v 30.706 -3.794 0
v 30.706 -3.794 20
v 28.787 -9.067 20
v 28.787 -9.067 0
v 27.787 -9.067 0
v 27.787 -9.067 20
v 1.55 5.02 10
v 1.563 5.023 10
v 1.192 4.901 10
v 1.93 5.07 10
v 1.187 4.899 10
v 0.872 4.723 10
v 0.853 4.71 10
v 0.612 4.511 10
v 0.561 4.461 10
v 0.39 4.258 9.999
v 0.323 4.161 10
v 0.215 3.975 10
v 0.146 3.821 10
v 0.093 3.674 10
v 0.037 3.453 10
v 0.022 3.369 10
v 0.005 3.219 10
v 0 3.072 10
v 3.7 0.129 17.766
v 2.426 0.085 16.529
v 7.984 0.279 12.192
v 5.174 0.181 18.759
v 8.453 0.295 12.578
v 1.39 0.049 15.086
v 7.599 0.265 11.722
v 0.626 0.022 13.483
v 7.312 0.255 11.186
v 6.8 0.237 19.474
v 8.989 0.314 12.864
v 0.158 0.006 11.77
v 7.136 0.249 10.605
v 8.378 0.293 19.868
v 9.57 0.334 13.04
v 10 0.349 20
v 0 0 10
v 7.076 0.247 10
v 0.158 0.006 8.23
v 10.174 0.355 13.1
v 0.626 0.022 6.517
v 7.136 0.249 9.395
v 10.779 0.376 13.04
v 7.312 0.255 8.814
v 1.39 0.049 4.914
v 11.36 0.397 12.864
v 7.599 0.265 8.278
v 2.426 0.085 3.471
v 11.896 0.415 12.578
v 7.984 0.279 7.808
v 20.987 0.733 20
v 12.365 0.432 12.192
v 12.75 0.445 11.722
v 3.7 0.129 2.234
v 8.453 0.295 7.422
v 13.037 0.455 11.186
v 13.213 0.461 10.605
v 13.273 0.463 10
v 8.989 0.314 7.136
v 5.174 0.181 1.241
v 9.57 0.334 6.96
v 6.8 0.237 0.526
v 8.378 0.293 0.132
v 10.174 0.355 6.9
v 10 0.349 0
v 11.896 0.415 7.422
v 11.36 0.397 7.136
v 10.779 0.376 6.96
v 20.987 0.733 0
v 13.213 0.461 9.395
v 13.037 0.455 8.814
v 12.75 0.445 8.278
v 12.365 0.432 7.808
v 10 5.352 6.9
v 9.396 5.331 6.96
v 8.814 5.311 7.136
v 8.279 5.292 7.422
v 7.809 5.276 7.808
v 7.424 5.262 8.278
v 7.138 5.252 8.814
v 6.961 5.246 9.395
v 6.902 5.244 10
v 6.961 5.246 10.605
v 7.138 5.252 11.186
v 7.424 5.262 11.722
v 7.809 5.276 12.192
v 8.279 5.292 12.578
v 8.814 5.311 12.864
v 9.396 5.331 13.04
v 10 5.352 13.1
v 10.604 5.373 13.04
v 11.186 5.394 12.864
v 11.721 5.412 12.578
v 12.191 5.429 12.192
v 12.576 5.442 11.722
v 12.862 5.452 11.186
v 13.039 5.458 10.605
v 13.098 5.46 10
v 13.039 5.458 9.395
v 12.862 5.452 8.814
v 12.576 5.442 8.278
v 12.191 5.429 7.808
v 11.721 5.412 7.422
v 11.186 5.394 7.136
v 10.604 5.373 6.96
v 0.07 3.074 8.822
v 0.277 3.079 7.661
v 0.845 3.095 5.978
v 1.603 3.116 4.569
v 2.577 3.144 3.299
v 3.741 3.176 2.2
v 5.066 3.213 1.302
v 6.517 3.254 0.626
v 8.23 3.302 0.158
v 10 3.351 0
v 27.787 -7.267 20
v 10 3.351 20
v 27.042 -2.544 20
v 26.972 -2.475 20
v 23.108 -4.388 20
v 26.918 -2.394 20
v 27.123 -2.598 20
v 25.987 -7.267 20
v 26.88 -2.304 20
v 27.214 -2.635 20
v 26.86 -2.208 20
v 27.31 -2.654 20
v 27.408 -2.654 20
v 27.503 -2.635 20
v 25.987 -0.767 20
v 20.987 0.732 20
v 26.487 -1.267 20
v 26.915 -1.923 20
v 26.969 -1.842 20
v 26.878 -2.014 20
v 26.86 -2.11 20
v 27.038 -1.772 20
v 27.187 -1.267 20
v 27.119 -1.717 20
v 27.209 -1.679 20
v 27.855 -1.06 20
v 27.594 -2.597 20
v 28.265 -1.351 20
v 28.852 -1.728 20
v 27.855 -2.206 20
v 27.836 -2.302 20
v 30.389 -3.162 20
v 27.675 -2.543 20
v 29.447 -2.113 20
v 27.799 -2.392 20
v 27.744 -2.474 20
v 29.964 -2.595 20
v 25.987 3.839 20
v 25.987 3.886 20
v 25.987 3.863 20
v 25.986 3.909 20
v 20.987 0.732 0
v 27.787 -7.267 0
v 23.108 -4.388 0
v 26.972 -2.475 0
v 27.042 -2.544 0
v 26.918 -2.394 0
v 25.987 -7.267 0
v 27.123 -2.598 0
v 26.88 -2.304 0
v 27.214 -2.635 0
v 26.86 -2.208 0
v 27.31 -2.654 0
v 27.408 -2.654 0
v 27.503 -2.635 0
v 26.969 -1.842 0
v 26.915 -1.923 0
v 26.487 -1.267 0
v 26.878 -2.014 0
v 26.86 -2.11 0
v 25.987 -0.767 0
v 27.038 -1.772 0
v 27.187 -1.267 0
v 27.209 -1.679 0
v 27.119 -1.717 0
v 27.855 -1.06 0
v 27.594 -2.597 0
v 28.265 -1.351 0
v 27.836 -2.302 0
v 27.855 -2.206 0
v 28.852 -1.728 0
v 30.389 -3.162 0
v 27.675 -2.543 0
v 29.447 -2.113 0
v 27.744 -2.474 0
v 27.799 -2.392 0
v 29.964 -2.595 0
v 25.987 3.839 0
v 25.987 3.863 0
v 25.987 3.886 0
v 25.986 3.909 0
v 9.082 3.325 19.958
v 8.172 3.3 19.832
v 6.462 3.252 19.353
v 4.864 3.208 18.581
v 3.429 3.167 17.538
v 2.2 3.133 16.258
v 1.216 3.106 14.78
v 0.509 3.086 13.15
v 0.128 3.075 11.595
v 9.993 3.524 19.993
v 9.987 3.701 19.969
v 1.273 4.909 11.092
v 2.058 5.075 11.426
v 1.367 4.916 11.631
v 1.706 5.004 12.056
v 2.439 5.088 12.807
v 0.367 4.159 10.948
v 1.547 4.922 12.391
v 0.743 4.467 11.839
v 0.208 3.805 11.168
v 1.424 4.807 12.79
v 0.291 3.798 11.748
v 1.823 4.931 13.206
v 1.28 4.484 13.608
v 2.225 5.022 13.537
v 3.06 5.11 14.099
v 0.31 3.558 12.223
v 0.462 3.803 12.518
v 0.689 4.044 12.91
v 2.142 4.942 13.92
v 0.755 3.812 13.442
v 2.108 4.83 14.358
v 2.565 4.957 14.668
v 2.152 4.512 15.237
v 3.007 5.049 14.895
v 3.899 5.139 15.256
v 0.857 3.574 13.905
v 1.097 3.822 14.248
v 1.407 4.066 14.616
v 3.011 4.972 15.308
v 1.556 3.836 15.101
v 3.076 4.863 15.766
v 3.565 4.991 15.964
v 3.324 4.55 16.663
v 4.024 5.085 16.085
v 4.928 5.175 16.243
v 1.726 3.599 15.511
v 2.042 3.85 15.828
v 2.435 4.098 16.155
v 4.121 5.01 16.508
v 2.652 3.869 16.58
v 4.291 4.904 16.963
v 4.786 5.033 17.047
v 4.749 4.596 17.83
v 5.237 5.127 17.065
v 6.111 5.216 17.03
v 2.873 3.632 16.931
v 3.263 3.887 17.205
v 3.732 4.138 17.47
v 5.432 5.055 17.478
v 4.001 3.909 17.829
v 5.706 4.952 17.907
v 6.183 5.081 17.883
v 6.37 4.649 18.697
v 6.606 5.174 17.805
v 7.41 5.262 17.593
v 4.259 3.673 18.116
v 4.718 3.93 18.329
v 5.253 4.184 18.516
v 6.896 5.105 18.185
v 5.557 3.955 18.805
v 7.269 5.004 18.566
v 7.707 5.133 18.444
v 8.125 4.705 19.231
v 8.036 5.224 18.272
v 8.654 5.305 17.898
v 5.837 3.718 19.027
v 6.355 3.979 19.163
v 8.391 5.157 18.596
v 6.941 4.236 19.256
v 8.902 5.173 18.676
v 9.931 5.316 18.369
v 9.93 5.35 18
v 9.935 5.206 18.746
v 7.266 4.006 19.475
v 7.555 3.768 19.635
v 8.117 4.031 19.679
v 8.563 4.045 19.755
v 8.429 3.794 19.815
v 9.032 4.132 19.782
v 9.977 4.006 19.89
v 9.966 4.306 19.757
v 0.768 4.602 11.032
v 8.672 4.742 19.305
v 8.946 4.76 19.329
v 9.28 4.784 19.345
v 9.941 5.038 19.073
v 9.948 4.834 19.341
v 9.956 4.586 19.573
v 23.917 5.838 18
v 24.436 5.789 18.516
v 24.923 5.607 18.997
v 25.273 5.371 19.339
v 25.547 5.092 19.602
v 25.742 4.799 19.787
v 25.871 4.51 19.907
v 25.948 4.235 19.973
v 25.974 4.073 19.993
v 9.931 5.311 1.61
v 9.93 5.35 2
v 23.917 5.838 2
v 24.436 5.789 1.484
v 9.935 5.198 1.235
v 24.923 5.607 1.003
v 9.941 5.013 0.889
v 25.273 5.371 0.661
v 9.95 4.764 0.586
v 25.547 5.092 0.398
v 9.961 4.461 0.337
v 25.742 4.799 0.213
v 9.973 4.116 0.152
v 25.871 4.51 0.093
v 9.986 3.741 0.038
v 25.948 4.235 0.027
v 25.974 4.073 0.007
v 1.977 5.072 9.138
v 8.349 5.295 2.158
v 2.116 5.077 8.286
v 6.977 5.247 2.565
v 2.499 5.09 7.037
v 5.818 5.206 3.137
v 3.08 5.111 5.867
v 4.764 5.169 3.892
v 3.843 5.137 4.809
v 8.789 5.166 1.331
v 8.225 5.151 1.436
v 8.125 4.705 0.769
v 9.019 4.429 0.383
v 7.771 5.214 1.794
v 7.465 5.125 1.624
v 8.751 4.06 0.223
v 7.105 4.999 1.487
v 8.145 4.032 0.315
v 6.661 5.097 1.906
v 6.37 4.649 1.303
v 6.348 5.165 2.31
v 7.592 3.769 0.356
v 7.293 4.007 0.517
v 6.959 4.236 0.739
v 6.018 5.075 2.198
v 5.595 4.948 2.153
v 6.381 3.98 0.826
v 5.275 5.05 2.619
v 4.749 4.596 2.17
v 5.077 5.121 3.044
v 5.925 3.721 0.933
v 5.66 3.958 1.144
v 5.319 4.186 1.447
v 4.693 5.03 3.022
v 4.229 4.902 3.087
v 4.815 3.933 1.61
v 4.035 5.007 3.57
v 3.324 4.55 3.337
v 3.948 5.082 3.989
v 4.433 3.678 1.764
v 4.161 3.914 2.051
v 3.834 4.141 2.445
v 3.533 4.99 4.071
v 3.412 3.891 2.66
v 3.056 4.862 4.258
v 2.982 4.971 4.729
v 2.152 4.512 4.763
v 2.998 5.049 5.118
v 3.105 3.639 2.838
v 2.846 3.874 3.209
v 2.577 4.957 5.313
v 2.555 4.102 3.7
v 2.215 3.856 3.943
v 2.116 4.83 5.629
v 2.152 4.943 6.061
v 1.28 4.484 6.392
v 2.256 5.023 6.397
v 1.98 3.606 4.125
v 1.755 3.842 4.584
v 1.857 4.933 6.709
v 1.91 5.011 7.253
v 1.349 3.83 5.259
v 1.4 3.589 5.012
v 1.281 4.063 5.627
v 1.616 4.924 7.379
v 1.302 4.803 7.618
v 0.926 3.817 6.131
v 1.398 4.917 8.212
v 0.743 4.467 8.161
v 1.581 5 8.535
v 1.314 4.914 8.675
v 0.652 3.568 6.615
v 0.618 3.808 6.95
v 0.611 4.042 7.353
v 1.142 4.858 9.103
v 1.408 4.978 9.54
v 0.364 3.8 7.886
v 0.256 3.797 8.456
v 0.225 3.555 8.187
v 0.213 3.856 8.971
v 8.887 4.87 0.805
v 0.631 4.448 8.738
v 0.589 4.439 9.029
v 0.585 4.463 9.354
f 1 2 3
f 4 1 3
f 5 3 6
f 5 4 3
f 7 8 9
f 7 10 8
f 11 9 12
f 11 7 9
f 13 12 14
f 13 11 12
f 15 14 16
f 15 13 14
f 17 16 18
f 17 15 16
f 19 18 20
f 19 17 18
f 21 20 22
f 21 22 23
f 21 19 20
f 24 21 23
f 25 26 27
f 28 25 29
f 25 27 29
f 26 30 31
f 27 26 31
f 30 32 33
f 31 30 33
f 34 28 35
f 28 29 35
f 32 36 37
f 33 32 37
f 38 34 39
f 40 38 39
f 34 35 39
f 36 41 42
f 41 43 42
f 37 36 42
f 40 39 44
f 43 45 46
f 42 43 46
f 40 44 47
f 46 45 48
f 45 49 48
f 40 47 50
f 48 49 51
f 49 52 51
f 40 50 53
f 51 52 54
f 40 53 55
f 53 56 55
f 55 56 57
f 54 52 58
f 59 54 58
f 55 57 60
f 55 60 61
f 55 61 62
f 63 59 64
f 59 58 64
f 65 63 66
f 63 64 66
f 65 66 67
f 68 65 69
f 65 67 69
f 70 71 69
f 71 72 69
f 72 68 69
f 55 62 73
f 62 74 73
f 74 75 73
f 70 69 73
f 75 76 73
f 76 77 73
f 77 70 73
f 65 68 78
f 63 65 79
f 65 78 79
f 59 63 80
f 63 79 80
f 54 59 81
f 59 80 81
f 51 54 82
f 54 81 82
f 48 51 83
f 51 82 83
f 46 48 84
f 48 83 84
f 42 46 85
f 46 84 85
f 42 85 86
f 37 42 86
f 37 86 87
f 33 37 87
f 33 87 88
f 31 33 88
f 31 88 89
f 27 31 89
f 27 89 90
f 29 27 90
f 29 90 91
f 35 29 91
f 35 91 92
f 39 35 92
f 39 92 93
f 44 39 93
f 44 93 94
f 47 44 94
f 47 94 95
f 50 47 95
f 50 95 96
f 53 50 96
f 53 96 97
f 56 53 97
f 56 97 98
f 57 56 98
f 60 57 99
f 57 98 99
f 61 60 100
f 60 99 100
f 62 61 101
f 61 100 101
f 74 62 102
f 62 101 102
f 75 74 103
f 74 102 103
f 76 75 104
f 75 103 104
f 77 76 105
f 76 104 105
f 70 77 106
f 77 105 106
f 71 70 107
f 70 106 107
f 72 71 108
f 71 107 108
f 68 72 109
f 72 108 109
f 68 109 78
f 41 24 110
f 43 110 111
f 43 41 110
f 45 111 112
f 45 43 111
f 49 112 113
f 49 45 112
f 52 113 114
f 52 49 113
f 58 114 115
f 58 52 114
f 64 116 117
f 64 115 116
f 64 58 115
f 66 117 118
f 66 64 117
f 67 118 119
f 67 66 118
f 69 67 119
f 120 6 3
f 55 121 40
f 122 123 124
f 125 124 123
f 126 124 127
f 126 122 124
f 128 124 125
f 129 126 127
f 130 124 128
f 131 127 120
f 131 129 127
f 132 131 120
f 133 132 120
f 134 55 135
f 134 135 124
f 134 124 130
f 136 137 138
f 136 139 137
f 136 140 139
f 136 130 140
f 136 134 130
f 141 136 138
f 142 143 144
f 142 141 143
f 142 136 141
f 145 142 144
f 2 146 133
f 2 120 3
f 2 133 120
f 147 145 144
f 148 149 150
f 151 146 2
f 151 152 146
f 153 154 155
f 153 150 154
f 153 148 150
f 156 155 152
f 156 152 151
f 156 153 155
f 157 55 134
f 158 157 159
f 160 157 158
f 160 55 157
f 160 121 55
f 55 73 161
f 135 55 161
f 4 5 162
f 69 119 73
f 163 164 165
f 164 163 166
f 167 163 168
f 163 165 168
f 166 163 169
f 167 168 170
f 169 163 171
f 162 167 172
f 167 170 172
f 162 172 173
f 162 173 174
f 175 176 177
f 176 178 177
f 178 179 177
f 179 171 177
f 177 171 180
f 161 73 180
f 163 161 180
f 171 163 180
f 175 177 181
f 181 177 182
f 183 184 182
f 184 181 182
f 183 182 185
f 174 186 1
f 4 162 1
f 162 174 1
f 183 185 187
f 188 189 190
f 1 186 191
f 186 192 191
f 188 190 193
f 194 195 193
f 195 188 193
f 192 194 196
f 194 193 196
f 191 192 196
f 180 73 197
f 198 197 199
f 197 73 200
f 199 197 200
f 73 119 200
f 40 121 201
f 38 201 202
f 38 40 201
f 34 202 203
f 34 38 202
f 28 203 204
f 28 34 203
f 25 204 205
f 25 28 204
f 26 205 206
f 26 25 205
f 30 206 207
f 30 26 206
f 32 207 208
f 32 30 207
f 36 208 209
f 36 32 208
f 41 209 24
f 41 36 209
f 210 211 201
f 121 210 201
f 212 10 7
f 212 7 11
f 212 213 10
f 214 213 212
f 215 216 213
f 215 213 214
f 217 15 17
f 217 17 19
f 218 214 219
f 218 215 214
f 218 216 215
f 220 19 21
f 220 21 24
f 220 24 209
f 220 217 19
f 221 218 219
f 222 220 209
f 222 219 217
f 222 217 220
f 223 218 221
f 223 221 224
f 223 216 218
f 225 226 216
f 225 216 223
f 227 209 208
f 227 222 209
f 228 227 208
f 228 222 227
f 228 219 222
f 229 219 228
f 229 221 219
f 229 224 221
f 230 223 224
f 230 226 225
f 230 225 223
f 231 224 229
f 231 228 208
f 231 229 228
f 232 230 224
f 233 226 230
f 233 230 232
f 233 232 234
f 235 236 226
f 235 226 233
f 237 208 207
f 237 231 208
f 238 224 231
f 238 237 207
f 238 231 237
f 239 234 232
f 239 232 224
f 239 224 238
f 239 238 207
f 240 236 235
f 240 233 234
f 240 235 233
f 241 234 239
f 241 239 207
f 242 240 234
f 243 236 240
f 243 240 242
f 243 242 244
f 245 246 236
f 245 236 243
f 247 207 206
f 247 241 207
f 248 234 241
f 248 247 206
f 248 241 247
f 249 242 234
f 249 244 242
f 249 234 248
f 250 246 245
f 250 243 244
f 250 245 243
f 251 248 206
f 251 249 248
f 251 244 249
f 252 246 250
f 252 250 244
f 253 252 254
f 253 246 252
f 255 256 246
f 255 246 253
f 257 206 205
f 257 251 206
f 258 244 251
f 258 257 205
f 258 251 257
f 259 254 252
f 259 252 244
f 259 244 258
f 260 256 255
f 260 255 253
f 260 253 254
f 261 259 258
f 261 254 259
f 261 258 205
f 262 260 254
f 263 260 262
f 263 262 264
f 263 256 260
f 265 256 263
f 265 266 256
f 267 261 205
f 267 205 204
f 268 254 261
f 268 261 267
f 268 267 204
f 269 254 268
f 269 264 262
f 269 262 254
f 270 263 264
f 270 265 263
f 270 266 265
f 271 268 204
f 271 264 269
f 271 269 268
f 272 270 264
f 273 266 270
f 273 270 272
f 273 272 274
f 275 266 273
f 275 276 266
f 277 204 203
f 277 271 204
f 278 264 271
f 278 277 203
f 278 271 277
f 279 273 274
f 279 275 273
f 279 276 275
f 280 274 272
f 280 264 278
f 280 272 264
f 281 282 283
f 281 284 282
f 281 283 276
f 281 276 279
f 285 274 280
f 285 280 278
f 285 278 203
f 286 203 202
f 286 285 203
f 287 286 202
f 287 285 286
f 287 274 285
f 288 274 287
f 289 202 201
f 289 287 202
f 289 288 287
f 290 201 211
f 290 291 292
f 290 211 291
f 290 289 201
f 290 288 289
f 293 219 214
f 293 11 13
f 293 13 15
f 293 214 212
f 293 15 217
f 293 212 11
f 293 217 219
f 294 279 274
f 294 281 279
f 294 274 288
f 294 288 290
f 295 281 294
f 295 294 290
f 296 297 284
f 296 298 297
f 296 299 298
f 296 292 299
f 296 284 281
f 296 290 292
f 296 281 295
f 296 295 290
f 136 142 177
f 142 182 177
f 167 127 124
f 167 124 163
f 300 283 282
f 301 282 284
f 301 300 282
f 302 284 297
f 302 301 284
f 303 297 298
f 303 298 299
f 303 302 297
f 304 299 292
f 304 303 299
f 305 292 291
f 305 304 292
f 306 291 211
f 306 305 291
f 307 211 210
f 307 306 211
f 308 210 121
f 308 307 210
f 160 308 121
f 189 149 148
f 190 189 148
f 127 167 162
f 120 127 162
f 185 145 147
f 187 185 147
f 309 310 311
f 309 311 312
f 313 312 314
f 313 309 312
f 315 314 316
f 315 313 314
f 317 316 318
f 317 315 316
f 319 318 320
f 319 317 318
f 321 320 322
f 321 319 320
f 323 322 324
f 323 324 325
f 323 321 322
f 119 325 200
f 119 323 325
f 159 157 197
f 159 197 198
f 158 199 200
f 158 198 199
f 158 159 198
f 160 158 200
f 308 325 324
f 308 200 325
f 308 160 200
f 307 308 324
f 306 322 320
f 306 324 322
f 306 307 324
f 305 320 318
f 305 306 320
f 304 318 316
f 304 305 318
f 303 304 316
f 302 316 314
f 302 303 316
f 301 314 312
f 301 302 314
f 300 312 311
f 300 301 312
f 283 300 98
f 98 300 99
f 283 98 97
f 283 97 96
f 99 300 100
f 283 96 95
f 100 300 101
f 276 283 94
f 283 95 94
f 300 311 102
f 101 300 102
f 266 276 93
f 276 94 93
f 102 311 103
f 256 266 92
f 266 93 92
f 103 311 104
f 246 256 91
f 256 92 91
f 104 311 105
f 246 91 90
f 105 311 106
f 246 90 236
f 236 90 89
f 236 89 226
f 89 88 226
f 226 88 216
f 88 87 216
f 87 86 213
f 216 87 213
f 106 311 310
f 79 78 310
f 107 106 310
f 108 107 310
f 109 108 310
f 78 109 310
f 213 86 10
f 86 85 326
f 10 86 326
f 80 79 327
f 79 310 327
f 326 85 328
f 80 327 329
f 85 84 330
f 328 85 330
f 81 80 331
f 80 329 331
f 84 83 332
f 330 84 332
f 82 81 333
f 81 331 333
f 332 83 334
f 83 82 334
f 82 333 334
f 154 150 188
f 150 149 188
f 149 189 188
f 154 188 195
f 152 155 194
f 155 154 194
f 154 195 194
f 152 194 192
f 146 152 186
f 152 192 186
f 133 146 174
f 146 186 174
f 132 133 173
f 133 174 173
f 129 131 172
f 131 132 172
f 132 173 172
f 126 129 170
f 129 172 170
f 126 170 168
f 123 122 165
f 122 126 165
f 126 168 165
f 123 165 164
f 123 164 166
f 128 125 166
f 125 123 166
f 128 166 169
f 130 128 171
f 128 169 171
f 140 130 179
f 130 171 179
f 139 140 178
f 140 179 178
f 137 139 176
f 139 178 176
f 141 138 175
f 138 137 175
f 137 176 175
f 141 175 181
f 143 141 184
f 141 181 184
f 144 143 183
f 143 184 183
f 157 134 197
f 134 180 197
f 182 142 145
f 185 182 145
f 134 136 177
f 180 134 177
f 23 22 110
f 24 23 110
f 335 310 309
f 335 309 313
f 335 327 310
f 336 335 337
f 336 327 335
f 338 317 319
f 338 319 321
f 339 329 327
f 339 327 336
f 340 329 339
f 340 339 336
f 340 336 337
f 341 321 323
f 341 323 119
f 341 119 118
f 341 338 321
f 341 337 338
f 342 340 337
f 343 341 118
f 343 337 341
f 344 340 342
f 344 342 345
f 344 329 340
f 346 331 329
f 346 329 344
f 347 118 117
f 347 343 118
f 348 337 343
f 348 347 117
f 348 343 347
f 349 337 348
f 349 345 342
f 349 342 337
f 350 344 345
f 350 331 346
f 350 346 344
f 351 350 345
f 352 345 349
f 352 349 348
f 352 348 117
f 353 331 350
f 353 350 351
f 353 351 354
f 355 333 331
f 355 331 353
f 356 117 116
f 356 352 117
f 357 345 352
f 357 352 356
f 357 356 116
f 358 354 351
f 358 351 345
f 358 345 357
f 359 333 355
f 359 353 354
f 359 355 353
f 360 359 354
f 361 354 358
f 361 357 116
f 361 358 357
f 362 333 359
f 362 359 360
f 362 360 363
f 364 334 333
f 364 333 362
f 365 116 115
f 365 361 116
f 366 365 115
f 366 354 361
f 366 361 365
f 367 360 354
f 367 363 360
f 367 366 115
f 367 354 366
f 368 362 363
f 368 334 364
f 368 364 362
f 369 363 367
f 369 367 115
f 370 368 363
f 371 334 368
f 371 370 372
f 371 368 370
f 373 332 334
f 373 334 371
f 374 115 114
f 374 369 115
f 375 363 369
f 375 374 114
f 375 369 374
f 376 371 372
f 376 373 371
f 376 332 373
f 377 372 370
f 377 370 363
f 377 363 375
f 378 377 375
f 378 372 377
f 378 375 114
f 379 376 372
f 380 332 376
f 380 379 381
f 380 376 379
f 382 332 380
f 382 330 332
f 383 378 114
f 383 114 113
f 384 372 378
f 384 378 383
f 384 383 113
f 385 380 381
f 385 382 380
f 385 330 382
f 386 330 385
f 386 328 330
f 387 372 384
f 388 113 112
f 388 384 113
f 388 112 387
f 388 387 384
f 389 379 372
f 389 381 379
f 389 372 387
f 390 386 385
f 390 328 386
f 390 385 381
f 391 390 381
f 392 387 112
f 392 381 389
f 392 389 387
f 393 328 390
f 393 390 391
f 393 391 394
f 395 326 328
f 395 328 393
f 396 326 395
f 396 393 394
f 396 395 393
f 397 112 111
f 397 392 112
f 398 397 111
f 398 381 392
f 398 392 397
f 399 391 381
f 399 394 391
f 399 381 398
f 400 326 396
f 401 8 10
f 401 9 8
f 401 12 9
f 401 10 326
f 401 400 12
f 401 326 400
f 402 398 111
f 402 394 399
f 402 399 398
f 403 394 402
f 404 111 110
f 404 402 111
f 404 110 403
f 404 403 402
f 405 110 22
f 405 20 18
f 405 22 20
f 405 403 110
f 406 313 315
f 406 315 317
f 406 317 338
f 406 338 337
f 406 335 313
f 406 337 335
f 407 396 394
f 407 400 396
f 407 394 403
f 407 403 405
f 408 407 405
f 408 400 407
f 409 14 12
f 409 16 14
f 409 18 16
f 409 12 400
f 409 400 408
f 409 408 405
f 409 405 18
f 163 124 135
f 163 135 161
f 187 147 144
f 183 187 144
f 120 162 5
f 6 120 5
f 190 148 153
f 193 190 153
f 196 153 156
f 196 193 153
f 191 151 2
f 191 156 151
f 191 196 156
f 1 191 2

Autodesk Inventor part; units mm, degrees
ref_plane "YZ Plane" through (0, 0, 0) normal (1, 0, 0) x (0, 1, 0)
ref_plane "XZ Plane" through (0, 0, 0) normal (0, 1, 0) x (-1, 0, 0)
ref_plane "XY Plane" through (0, 0, 0) normal (0, 0, 1) x (1, 0, 0)
sketch "Sketch1" plane through (0, 0, 0) normal (0, 0, 1) x (1, 0, 0)
  line L0 (0, 0) -> (20.9872, 0.7329)
  line L1 (20.9872, 0.7329) -> (20.9872, -7.2671)
  line L2 (20.9872, -7.2671) -> (27.7872, -7.2671)
  line L3 (27.7872, -7.2671) -> (27.7872, -9.0671)
  line L4 (27.1872, -1.2671) -> (25.9872, -1.2671)
  line L5 (25.9872, -1.2671) -> (25.9872, 5.9105)
  line L6 (25.9872, 5.9105) -> (0, 5.003)
  line L7 (0, 5.003) -> (0, 0)
  line L8 (30.7063, -3.7945) -> (28.7872, -9.0671)
  line L9 (28.7872, -9.0671) -> (27.7872, -9.0671)
  line L10 (27.1872, -1.2671) -> (27.8551, -1.0596)
  line L11 (27.8551, -1.0596) -> (28.2648, -1.3511)
  line L12 (28.2648, -1.3511) -> (27.2091, -1.6792)
  arc A0 (30.7063, -3.7945) -> (28.8522, -1.7285) centre (26.9872, -5.2671) ccw
  arc A1 (27.2091, -1.6792) -> (27.8551, -2.2058) centre (27.3575, -2.1566) ccw
  line L13 (27.8551, -2.2058) -> (28.8522, -1.7285)
  point P0 (30.7872, -1.2671)
  dimension "d0" = 21
  dimension "d1" = 5
  dimension "d2" = 5
  dimension "d4" = 1.8
  dimension "d5" = 6
  dimension "d6" = 1.8
  dimension "d31" = 88
  dimension "d32" = 8
  dimension "d35" = 110
  dimension "d36" = 1
  dimension "d38" = 6
  dimension "d40" = 0.4
  dimension "d41" = 4
  dimension "d42" = 2
  dimension "d44" = 1.2
  dimension "d45" = 1
extrude "Extrusion1" add sketch "Sketch1" along normal blind 20
fillet "Fillet1" [suppressed]
fillet "Fillet2" radius 10 2 edges at (0, 2.5015, 0) (0, 2.5015, 20)
sketch "Sketch2" plane through (10, 5.3523, 10) normal (-0.0349, 0.9994, 0) x (0, 0, -1)
  circle A0 centre (0, 0) radius 3.1
  ellipse E0 centre (0, 0) end of major axis (0, 10.0061) minor radius 10 (10, 0) -> (-10, 0) ccw projected
  line L0 (-10, 0) -> (-10, -15.997) projected
  point P0 (10, 10.1807)
  dimension "d16" = 6.2
  dimension "d33" = 10
  dimension "d34" = 0
extrude "Extrusion2" cut sketch "Sketch2" against normal blind 10
fillet "Fillet3" radius 2 4 edges at (17.9934, 5.6314, 0) (2.9288, 5.1053, 2.9288) (17.9934, 5.6314, 20) (25.9872, 5.9105, 10)
chamfer "Chamfer2" distance 5 angle 45 1 edges at (20.9872, -7.2671, 10)
chamfer "Chamfer3" distance 3 angle 45 1 edges at (20.9872, -2.2671, 10)
chamfer "Chamfer4" distance 0.5 angle 45 1 edges at (25.9872, -1.2671, 10)
properties part number "PiedClip"
